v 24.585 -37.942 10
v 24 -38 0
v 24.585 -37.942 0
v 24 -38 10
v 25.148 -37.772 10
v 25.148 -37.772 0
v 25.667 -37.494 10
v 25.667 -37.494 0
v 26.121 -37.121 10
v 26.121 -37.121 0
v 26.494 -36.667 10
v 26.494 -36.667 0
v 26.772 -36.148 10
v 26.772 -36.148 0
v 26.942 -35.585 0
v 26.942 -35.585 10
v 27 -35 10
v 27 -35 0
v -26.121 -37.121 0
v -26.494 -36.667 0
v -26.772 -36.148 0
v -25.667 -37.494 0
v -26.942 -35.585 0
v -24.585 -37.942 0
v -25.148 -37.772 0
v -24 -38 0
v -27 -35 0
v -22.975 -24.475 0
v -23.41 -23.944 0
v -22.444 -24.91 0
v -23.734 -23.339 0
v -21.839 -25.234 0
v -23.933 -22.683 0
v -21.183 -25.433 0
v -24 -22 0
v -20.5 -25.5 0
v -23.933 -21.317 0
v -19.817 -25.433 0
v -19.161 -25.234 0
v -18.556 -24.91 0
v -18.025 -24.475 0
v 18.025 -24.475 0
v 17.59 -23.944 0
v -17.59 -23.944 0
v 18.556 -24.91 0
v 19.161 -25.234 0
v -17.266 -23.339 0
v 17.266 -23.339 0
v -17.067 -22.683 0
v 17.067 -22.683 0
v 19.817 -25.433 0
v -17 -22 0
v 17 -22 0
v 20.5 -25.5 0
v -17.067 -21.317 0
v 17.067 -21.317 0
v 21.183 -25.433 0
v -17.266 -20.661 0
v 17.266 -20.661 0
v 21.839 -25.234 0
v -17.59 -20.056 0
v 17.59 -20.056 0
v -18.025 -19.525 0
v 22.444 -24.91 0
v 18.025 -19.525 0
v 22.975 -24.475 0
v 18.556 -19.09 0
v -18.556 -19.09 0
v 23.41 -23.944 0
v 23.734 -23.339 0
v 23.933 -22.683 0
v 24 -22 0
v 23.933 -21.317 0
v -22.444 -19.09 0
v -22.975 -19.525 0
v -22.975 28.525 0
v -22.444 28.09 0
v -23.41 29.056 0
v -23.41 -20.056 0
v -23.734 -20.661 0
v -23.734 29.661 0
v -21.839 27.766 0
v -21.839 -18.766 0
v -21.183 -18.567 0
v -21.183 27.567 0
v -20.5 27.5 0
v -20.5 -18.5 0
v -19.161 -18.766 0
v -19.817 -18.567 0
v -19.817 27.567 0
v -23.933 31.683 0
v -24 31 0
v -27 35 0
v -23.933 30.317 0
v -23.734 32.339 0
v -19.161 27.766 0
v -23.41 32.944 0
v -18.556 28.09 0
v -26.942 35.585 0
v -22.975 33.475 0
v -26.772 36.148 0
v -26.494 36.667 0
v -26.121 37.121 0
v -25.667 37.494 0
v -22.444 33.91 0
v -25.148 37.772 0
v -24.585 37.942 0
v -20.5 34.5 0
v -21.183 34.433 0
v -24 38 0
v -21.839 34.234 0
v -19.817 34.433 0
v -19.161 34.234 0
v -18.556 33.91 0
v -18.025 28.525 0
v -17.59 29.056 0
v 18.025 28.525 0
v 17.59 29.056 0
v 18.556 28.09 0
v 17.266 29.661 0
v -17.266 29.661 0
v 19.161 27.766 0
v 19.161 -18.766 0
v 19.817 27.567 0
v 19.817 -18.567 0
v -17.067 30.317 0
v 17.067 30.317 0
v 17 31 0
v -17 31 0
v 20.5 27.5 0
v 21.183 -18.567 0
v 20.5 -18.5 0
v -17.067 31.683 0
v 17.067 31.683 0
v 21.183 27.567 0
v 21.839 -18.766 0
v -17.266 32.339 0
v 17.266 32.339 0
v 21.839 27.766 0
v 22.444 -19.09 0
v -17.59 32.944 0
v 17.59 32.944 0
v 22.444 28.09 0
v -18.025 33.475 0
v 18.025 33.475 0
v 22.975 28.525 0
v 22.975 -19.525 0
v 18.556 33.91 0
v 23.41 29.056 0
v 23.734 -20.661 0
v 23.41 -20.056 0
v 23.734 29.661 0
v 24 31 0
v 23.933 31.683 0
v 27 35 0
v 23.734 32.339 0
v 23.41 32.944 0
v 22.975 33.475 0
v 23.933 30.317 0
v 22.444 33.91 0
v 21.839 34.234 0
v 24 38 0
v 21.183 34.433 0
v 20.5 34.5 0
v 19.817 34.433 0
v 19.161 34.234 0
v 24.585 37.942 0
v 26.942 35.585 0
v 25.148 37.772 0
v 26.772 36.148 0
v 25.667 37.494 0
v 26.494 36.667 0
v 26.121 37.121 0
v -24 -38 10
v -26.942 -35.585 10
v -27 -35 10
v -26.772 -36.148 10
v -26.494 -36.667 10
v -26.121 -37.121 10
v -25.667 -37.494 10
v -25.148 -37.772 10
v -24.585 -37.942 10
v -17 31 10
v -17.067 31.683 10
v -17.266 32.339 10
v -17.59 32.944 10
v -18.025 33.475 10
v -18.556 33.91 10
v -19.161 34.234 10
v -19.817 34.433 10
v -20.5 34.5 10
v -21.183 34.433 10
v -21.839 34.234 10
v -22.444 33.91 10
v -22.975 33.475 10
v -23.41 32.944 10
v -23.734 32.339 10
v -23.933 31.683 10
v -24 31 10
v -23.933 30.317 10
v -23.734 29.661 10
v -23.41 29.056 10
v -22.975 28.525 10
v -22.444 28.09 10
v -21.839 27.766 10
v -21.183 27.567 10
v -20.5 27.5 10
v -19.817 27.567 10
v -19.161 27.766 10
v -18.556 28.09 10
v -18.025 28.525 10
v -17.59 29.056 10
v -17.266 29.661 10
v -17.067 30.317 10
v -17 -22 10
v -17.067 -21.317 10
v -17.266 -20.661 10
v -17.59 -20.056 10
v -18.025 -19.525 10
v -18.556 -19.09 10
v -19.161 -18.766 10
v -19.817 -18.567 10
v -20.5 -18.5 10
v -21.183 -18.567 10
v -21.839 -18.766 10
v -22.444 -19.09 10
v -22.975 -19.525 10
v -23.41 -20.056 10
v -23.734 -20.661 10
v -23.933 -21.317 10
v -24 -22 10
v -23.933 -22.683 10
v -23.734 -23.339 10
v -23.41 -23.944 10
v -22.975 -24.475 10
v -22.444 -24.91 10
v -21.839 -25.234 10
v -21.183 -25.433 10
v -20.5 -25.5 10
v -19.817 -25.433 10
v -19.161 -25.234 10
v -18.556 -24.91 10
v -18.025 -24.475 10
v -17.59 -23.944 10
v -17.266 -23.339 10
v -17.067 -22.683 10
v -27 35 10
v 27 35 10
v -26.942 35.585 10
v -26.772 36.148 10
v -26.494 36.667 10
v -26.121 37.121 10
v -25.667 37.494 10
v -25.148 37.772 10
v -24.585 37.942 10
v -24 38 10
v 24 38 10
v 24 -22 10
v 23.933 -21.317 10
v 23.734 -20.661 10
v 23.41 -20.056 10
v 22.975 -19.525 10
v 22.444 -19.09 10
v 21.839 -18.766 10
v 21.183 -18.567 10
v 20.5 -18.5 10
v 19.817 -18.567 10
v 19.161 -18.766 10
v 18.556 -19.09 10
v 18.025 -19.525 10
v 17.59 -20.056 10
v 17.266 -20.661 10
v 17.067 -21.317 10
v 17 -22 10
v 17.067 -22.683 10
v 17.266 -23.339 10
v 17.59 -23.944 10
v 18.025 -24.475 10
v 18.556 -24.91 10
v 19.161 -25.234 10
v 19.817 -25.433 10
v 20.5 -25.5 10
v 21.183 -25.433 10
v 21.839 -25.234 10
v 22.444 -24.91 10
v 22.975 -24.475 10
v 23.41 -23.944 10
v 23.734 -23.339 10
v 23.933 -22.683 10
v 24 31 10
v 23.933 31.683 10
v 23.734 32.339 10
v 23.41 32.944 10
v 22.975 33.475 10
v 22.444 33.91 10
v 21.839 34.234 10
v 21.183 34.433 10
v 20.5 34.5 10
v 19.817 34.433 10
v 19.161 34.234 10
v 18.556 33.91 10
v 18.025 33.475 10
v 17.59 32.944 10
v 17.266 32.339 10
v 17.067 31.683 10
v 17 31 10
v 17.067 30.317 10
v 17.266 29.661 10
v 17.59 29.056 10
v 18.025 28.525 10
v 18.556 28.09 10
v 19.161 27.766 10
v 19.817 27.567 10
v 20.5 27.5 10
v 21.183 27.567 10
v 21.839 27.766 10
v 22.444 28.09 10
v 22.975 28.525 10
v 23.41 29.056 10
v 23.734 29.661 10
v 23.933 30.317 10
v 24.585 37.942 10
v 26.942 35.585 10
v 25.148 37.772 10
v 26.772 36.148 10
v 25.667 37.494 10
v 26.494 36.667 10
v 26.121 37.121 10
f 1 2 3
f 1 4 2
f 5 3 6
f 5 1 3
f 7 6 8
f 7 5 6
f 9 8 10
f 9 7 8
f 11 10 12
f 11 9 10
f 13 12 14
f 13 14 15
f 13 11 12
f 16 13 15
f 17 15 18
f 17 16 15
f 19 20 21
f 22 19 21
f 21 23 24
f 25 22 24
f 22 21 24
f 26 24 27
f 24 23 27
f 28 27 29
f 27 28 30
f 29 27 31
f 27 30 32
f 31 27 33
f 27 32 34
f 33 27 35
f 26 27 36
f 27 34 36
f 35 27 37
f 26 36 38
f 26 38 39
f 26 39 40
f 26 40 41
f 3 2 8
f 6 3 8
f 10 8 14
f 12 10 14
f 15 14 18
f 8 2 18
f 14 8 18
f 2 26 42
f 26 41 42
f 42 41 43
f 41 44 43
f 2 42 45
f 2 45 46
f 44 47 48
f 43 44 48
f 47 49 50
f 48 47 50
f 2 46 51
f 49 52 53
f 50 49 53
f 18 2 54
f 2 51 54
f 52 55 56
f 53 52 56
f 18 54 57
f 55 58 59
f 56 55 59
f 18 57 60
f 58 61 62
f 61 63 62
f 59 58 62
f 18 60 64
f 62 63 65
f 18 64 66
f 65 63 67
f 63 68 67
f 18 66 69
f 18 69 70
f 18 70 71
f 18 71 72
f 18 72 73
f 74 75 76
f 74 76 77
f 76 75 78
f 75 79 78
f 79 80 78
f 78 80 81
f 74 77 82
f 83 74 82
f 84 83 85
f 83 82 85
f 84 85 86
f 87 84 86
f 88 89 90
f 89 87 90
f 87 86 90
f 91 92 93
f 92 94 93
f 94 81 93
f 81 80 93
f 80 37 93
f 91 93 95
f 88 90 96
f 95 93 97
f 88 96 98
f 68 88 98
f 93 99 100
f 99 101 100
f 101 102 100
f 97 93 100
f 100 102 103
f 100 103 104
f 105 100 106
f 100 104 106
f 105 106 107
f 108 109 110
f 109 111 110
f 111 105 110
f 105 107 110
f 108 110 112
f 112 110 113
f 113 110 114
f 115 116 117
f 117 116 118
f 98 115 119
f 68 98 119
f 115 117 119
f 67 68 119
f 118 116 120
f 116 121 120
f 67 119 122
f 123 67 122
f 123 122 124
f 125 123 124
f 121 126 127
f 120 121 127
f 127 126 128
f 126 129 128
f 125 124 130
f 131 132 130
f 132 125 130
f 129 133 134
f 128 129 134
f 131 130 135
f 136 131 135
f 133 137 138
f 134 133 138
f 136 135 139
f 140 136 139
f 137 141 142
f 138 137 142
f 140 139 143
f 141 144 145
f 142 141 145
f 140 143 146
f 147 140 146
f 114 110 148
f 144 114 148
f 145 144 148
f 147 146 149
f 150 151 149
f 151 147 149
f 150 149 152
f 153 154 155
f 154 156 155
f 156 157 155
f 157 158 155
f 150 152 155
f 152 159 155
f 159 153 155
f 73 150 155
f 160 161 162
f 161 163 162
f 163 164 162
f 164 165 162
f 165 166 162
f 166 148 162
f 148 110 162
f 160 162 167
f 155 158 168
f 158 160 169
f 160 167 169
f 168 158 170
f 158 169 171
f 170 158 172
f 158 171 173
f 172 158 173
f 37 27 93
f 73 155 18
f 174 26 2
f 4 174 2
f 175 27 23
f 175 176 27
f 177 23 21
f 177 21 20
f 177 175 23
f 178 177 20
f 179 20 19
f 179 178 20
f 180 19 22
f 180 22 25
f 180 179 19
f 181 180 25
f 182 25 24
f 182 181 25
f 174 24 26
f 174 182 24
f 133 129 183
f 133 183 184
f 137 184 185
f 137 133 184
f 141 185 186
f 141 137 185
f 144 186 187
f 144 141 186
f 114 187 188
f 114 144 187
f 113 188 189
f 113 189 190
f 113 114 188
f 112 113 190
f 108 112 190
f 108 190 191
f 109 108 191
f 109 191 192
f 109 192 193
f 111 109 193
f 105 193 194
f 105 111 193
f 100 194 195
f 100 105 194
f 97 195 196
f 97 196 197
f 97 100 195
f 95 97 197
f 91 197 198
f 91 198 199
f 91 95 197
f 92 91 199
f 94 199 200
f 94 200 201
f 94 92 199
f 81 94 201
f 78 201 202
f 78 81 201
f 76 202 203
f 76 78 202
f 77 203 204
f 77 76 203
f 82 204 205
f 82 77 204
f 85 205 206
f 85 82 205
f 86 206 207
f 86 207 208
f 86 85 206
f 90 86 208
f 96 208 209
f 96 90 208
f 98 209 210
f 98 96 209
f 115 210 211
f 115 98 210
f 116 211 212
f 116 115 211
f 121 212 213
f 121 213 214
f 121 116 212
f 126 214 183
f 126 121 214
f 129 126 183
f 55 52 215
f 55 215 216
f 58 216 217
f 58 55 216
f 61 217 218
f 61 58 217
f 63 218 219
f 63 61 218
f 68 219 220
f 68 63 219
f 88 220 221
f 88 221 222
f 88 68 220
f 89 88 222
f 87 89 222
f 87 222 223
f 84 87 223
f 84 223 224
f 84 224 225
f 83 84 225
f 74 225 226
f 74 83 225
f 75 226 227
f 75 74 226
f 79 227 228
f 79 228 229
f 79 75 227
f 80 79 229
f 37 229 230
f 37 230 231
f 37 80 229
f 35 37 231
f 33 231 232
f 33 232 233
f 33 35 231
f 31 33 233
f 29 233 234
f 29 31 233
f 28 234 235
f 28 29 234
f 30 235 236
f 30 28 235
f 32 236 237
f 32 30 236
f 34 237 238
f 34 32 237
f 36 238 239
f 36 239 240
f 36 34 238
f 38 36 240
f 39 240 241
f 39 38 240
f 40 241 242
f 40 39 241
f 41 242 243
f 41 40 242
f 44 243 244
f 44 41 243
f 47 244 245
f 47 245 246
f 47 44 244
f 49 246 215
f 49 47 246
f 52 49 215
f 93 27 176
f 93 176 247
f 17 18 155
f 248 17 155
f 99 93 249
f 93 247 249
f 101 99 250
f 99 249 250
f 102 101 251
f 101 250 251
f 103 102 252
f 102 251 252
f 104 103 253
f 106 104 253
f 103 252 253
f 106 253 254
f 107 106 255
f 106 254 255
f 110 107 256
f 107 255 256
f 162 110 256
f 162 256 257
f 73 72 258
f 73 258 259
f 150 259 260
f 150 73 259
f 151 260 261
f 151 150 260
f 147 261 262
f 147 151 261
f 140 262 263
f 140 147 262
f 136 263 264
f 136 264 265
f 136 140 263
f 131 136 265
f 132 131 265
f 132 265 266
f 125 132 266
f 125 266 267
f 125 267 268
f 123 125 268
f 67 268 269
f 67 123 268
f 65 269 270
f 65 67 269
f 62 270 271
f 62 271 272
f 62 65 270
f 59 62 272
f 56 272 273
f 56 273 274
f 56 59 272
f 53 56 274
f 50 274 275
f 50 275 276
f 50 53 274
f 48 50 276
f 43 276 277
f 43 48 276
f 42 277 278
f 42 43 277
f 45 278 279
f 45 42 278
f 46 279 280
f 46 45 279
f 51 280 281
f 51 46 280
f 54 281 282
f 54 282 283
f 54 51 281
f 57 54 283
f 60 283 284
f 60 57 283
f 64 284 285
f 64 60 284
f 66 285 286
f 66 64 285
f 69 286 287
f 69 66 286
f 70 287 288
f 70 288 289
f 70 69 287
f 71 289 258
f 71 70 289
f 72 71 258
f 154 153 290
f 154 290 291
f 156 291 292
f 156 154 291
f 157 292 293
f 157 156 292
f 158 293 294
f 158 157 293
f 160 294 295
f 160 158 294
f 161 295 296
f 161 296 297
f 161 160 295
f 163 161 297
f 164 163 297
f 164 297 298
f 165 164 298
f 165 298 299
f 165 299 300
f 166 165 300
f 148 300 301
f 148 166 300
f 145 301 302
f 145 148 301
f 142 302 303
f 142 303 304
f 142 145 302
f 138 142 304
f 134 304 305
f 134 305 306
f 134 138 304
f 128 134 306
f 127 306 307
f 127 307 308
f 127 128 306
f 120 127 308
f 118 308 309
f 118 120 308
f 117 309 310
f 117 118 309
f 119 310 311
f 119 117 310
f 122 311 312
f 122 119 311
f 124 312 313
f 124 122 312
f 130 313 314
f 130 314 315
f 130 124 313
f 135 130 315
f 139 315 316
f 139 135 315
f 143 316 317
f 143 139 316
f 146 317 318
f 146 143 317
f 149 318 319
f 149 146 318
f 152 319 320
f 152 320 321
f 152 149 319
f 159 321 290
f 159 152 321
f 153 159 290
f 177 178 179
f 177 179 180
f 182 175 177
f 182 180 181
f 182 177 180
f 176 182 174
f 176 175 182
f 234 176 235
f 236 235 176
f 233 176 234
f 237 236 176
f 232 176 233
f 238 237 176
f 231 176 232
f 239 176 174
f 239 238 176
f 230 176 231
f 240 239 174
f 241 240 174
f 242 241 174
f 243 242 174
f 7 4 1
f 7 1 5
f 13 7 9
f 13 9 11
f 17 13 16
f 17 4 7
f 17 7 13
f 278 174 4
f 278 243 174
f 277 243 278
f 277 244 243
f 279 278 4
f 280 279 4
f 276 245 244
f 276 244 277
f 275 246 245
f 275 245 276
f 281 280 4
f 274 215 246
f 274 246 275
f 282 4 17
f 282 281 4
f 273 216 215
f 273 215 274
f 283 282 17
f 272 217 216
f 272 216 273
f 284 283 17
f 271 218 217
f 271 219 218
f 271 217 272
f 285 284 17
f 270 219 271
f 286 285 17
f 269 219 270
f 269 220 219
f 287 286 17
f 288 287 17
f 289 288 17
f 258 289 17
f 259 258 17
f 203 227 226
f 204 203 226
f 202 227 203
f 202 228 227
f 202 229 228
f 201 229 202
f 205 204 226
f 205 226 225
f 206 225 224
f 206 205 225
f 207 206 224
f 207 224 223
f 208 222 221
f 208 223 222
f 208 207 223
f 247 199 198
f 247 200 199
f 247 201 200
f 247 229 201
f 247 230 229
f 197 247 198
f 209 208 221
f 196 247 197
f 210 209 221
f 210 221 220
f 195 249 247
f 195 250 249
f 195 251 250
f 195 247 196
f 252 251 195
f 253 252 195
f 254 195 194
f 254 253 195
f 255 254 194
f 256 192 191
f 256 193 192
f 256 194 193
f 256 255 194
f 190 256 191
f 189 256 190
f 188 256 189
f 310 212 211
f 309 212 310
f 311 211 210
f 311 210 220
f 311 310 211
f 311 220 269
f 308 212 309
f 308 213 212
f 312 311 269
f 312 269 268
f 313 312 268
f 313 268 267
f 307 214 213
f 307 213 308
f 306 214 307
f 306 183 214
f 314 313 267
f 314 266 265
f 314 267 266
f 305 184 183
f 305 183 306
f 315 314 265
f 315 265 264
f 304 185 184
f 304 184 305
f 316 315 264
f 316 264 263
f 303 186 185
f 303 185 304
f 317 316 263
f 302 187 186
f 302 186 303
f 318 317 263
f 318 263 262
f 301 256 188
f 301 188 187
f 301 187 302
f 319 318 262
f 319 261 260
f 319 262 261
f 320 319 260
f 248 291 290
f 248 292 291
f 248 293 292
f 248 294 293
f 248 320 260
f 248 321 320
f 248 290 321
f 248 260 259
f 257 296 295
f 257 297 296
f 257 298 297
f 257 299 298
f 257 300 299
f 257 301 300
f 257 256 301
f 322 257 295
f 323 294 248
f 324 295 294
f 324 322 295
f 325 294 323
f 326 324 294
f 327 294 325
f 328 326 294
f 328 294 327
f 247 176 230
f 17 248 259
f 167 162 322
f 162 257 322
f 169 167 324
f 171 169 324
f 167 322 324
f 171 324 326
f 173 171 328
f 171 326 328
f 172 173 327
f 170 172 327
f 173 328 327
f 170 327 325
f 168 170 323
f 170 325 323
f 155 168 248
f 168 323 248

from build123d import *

# Parameters (mm, degrees)
SKETCH_W      = 54
SKETCH_H      = 76
SKETCH_R      = 3.5
EXTRUDE_DEPTH = 10
FILLET_R      = 3


with BuildPart() as part:
    # Sketch → Extrude (new body)
    with BuildSketch(Plane.XY):
        Rectangle(SKETCH_W, SKETCH_H)
        with Locations((-20.5, 31)):
            Circle(SKETCH_R, mode=Mode.SUBTRACT)
        with Locations((20.5, 31)):
            Circle(SKETCH_R, mode=Mode.SUBTRACT)
        with Locations((-20.5, -22)):
            Circle(SKETCH_R, mode=Mode.SUBTRACT)
        with Locations((20.5, -22)):
            Circle(SKETCH_R, mode=Mode.SUBTRACT)
    extrude(amount=EXTRUDE_DEPTH)

    # Fillet
    fillet_edges = [part.edges().sort_by_distance(p)[0] for p in [
        (-27, 38, 5),
        (27, 38, 5),
        (27, -38, 5),
        (-27, -38, 5),
    ]]
    fillet(fillet_edges, radius=FILLET_R)


solid = part.part
